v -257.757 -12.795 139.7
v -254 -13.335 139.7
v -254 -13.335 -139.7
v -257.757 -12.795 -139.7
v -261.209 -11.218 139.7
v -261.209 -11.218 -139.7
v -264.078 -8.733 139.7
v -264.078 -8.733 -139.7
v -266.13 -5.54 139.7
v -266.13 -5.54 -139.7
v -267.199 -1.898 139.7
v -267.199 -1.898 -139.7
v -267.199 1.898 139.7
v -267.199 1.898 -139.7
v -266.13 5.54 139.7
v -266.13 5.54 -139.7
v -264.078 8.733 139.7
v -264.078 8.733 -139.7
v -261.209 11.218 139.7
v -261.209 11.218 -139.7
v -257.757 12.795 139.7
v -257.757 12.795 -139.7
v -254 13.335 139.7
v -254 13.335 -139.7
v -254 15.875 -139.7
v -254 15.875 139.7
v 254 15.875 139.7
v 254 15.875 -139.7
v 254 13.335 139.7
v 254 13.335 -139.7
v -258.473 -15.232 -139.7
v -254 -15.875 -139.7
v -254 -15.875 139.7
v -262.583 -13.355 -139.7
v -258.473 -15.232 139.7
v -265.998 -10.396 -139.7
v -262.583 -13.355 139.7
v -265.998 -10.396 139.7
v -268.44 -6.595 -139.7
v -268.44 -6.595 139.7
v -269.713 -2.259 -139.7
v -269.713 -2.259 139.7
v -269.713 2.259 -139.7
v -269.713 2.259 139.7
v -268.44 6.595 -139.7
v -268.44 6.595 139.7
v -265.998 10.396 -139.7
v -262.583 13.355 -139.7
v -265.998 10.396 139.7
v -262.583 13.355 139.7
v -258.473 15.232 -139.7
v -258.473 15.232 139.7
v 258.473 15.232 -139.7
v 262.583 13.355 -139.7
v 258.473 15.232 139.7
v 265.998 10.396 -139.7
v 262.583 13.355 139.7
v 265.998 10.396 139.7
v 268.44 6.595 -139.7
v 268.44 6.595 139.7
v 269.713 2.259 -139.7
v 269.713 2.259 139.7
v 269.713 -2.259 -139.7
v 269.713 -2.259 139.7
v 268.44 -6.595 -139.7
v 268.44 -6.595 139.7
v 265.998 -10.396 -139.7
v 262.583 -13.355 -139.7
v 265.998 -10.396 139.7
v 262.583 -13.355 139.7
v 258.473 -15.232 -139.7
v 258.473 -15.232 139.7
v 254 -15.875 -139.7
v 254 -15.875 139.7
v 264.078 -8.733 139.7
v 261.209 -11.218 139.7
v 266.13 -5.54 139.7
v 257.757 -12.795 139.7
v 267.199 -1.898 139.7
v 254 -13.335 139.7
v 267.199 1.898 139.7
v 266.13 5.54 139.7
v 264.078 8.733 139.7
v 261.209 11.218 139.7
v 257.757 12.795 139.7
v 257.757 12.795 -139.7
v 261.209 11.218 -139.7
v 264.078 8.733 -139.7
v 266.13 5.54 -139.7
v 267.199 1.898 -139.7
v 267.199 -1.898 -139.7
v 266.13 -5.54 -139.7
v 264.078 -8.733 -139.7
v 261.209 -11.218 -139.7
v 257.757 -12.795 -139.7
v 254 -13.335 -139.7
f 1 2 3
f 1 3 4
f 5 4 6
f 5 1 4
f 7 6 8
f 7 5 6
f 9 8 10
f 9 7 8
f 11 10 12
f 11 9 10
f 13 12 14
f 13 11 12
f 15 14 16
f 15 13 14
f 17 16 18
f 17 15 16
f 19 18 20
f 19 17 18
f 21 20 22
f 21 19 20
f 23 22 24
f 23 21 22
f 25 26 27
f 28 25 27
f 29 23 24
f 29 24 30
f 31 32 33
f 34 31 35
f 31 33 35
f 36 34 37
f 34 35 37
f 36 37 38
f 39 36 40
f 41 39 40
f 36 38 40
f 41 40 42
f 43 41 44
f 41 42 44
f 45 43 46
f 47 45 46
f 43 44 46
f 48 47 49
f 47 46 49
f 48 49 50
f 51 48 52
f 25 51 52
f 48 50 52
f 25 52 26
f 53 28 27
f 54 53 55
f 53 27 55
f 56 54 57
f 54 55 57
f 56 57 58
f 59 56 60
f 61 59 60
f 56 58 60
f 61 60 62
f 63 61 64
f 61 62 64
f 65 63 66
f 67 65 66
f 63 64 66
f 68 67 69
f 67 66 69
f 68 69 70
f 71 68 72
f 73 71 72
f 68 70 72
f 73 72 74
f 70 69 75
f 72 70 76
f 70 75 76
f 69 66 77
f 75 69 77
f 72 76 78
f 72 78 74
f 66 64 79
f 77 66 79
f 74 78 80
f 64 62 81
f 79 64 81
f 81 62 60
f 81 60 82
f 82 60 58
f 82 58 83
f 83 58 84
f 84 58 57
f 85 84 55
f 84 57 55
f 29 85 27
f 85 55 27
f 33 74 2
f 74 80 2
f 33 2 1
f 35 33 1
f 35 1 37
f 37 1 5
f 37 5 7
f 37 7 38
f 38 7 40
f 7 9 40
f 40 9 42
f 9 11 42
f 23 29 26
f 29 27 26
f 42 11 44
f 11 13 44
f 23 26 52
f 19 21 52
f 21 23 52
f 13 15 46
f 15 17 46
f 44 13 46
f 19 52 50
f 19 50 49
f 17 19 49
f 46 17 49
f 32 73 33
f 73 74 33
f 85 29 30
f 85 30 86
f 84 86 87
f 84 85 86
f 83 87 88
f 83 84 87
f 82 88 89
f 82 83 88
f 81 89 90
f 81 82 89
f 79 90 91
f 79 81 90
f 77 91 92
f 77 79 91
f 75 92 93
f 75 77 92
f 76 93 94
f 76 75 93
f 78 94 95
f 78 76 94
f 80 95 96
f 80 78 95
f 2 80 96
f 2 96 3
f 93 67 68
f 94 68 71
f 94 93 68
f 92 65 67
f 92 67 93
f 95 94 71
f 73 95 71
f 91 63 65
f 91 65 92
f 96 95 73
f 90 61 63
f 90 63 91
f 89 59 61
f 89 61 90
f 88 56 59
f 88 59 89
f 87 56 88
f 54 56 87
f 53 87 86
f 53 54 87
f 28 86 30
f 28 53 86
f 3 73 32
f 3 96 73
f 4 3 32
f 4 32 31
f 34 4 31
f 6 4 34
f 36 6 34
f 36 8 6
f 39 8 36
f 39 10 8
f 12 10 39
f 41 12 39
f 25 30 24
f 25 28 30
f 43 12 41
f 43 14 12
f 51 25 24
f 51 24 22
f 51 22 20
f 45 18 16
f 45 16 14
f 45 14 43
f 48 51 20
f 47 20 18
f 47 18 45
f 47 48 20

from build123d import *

# Parameters (mm, degrees)
BOSS_EXTRU_1_DEPTH      = 139.7
ENL_V_MAT_EXTRU_1_REACH = 390.779


with BuildPart() as part:
    # Esquisse1 → Boss.-Extru.1 (new, symmetric)
    with BuildSketch(Plane.XY):
        with BuildLine():
            Line((-254, 15.875), (254, 15.875))
            ThreePointArc((254, 15.875), (269.875, 0), (254, -15.875))
            Line((254, -15.875), (-254, -15.875))
            ThreePointArc((-254, -15.875), (-269.875, 0), (-254, 15.875))
        make_face()
    extrude(amount=BOSS_EXTRU_1_DEPTH, both=True)

    # Esquisse2 → Enlèv. mat.-Extru.1 (cut, up to next)
    with BuildSketch(Plane.XY.offset(139.7), mode=Mode.PRIVATE) as enl_v_mat_extru_1_sk1:
        with BuildLine():
            Line((-254, 13.335), (254, 13.335))
            ThreePointArc((254, 13.335), (267.335, 0), (254, -13.335))
            Line((254, -13.335), (-254, -13.335))
            ThreePointArc((-254, -13.335), (-267.335, 0), (-254, 13.335))
        make_face()
    enl_v_mat_extru_1_tool1 = extrude(enl_v_mat_extru_1_sk1.sketch, amount=-ENL_V_MAT_EXTRU_1_REACH, mode=Mode.PRIVATE) & part.part
    add(enl_v_mat_extru_1_tool1.solids().sort_by_distance((0, 0, 139.7))[0], mode=Mode.SUBTRACT)


solid = part.part
